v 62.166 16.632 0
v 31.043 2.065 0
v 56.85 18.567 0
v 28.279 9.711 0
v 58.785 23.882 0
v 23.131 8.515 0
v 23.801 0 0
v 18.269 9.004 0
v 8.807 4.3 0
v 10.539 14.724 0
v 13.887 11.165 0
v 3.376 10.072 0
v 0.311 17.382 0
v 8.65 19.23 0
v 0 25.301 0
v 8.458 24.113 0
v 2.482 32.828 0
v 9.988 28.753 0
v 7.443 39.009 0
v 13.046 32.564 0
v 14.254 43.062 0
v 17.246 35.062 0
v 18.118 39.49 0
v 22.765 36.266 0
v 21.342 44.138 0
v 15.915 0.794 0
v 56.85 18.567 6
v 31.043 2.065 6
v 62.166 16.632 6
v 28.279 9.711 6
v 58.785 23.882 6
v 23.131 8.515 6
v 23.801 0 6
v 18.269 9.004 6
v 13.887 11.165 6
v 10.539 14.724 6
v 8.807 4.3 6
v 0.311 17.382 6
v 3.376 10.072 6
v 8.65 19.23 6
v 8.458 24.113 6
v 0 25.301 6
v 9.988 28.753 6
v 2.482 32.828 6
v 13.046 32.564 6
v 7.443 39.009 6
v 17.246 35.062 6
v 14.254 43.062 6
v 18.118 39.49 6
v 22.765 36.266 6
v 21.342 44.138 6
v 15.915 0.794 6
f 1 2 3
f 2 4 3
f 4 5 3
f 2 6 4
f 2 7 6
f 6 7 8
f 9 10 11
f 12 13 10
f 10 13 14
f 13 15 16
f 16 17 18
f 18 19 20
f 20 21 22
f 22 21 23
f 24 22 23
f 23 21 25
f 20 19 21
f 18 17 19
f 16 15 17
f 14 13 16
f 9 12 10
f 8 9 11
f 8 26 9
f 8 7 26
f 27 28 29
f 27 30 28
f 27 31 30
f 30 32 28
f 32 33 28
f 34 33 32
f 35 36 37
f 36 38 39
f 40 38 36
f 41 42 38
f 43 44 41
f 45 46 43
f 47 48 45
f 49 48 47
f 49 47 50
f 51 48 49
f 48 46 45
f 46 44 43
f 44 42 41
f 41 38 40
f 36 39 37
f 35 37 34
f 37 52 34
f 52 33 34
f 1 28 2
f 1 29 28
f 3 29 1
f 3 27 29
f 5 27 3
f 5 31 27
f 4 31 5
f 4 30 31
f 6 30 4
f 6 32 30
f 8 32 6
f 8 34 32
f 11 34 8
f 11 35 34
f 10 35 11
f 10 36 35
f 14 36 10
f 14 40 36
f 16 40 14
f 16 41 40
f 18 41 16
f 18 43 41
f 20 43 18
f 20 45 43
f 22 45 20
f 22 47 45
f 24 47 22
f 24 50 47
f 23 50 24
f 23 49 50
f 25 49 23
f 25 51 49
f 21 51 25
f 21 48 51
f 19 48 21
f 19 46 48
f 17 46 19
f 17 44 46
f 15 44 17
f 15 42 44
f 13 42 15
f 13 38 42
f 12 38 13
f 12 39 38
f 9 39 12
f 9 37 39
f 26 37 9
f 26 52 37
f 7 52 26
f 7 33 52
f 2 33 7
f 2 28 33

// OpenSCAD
$fn = 32;

// ----------------------------------------------------------------------
// Hook plate: curl radius 18 mm over 205 degrees, 8 mm thick band
// ----------------------------------------------------------------------

// --- parameters (mm) ---
profile_height = 6;       // extrusion height
profile_points = 26;      // points of the closed outline

profile = [[18.118, 39.49], [21.342, 44.138], [14.254, 43.062], [7.443, 39.009], [2.482, 32.828], [0, 25.301], [0.311, 17.382], [3.376, 10.072], [8.807, 4.3], [15.915, 0.794], [23.801, 0], [31.043, 2.065], [62.166, 16.632], [56.85, 18.567], [58.785, 23.882], [28.279, 9.711], [23.131, 8.515], [18.269, 9.004], [13.887, 11.165], [10.539, 14.724], [8.65, 19.23], [8.458, 24.113], [9.988, 28.753], [13.046, 32.564], [17.246, 35.062], [22.765, 36.266]];  // single closed polygon, 26 points, counter clockwise

// --- the one profile operation ---
linear_extrude(height = profile_height) polygon(points = profile);
